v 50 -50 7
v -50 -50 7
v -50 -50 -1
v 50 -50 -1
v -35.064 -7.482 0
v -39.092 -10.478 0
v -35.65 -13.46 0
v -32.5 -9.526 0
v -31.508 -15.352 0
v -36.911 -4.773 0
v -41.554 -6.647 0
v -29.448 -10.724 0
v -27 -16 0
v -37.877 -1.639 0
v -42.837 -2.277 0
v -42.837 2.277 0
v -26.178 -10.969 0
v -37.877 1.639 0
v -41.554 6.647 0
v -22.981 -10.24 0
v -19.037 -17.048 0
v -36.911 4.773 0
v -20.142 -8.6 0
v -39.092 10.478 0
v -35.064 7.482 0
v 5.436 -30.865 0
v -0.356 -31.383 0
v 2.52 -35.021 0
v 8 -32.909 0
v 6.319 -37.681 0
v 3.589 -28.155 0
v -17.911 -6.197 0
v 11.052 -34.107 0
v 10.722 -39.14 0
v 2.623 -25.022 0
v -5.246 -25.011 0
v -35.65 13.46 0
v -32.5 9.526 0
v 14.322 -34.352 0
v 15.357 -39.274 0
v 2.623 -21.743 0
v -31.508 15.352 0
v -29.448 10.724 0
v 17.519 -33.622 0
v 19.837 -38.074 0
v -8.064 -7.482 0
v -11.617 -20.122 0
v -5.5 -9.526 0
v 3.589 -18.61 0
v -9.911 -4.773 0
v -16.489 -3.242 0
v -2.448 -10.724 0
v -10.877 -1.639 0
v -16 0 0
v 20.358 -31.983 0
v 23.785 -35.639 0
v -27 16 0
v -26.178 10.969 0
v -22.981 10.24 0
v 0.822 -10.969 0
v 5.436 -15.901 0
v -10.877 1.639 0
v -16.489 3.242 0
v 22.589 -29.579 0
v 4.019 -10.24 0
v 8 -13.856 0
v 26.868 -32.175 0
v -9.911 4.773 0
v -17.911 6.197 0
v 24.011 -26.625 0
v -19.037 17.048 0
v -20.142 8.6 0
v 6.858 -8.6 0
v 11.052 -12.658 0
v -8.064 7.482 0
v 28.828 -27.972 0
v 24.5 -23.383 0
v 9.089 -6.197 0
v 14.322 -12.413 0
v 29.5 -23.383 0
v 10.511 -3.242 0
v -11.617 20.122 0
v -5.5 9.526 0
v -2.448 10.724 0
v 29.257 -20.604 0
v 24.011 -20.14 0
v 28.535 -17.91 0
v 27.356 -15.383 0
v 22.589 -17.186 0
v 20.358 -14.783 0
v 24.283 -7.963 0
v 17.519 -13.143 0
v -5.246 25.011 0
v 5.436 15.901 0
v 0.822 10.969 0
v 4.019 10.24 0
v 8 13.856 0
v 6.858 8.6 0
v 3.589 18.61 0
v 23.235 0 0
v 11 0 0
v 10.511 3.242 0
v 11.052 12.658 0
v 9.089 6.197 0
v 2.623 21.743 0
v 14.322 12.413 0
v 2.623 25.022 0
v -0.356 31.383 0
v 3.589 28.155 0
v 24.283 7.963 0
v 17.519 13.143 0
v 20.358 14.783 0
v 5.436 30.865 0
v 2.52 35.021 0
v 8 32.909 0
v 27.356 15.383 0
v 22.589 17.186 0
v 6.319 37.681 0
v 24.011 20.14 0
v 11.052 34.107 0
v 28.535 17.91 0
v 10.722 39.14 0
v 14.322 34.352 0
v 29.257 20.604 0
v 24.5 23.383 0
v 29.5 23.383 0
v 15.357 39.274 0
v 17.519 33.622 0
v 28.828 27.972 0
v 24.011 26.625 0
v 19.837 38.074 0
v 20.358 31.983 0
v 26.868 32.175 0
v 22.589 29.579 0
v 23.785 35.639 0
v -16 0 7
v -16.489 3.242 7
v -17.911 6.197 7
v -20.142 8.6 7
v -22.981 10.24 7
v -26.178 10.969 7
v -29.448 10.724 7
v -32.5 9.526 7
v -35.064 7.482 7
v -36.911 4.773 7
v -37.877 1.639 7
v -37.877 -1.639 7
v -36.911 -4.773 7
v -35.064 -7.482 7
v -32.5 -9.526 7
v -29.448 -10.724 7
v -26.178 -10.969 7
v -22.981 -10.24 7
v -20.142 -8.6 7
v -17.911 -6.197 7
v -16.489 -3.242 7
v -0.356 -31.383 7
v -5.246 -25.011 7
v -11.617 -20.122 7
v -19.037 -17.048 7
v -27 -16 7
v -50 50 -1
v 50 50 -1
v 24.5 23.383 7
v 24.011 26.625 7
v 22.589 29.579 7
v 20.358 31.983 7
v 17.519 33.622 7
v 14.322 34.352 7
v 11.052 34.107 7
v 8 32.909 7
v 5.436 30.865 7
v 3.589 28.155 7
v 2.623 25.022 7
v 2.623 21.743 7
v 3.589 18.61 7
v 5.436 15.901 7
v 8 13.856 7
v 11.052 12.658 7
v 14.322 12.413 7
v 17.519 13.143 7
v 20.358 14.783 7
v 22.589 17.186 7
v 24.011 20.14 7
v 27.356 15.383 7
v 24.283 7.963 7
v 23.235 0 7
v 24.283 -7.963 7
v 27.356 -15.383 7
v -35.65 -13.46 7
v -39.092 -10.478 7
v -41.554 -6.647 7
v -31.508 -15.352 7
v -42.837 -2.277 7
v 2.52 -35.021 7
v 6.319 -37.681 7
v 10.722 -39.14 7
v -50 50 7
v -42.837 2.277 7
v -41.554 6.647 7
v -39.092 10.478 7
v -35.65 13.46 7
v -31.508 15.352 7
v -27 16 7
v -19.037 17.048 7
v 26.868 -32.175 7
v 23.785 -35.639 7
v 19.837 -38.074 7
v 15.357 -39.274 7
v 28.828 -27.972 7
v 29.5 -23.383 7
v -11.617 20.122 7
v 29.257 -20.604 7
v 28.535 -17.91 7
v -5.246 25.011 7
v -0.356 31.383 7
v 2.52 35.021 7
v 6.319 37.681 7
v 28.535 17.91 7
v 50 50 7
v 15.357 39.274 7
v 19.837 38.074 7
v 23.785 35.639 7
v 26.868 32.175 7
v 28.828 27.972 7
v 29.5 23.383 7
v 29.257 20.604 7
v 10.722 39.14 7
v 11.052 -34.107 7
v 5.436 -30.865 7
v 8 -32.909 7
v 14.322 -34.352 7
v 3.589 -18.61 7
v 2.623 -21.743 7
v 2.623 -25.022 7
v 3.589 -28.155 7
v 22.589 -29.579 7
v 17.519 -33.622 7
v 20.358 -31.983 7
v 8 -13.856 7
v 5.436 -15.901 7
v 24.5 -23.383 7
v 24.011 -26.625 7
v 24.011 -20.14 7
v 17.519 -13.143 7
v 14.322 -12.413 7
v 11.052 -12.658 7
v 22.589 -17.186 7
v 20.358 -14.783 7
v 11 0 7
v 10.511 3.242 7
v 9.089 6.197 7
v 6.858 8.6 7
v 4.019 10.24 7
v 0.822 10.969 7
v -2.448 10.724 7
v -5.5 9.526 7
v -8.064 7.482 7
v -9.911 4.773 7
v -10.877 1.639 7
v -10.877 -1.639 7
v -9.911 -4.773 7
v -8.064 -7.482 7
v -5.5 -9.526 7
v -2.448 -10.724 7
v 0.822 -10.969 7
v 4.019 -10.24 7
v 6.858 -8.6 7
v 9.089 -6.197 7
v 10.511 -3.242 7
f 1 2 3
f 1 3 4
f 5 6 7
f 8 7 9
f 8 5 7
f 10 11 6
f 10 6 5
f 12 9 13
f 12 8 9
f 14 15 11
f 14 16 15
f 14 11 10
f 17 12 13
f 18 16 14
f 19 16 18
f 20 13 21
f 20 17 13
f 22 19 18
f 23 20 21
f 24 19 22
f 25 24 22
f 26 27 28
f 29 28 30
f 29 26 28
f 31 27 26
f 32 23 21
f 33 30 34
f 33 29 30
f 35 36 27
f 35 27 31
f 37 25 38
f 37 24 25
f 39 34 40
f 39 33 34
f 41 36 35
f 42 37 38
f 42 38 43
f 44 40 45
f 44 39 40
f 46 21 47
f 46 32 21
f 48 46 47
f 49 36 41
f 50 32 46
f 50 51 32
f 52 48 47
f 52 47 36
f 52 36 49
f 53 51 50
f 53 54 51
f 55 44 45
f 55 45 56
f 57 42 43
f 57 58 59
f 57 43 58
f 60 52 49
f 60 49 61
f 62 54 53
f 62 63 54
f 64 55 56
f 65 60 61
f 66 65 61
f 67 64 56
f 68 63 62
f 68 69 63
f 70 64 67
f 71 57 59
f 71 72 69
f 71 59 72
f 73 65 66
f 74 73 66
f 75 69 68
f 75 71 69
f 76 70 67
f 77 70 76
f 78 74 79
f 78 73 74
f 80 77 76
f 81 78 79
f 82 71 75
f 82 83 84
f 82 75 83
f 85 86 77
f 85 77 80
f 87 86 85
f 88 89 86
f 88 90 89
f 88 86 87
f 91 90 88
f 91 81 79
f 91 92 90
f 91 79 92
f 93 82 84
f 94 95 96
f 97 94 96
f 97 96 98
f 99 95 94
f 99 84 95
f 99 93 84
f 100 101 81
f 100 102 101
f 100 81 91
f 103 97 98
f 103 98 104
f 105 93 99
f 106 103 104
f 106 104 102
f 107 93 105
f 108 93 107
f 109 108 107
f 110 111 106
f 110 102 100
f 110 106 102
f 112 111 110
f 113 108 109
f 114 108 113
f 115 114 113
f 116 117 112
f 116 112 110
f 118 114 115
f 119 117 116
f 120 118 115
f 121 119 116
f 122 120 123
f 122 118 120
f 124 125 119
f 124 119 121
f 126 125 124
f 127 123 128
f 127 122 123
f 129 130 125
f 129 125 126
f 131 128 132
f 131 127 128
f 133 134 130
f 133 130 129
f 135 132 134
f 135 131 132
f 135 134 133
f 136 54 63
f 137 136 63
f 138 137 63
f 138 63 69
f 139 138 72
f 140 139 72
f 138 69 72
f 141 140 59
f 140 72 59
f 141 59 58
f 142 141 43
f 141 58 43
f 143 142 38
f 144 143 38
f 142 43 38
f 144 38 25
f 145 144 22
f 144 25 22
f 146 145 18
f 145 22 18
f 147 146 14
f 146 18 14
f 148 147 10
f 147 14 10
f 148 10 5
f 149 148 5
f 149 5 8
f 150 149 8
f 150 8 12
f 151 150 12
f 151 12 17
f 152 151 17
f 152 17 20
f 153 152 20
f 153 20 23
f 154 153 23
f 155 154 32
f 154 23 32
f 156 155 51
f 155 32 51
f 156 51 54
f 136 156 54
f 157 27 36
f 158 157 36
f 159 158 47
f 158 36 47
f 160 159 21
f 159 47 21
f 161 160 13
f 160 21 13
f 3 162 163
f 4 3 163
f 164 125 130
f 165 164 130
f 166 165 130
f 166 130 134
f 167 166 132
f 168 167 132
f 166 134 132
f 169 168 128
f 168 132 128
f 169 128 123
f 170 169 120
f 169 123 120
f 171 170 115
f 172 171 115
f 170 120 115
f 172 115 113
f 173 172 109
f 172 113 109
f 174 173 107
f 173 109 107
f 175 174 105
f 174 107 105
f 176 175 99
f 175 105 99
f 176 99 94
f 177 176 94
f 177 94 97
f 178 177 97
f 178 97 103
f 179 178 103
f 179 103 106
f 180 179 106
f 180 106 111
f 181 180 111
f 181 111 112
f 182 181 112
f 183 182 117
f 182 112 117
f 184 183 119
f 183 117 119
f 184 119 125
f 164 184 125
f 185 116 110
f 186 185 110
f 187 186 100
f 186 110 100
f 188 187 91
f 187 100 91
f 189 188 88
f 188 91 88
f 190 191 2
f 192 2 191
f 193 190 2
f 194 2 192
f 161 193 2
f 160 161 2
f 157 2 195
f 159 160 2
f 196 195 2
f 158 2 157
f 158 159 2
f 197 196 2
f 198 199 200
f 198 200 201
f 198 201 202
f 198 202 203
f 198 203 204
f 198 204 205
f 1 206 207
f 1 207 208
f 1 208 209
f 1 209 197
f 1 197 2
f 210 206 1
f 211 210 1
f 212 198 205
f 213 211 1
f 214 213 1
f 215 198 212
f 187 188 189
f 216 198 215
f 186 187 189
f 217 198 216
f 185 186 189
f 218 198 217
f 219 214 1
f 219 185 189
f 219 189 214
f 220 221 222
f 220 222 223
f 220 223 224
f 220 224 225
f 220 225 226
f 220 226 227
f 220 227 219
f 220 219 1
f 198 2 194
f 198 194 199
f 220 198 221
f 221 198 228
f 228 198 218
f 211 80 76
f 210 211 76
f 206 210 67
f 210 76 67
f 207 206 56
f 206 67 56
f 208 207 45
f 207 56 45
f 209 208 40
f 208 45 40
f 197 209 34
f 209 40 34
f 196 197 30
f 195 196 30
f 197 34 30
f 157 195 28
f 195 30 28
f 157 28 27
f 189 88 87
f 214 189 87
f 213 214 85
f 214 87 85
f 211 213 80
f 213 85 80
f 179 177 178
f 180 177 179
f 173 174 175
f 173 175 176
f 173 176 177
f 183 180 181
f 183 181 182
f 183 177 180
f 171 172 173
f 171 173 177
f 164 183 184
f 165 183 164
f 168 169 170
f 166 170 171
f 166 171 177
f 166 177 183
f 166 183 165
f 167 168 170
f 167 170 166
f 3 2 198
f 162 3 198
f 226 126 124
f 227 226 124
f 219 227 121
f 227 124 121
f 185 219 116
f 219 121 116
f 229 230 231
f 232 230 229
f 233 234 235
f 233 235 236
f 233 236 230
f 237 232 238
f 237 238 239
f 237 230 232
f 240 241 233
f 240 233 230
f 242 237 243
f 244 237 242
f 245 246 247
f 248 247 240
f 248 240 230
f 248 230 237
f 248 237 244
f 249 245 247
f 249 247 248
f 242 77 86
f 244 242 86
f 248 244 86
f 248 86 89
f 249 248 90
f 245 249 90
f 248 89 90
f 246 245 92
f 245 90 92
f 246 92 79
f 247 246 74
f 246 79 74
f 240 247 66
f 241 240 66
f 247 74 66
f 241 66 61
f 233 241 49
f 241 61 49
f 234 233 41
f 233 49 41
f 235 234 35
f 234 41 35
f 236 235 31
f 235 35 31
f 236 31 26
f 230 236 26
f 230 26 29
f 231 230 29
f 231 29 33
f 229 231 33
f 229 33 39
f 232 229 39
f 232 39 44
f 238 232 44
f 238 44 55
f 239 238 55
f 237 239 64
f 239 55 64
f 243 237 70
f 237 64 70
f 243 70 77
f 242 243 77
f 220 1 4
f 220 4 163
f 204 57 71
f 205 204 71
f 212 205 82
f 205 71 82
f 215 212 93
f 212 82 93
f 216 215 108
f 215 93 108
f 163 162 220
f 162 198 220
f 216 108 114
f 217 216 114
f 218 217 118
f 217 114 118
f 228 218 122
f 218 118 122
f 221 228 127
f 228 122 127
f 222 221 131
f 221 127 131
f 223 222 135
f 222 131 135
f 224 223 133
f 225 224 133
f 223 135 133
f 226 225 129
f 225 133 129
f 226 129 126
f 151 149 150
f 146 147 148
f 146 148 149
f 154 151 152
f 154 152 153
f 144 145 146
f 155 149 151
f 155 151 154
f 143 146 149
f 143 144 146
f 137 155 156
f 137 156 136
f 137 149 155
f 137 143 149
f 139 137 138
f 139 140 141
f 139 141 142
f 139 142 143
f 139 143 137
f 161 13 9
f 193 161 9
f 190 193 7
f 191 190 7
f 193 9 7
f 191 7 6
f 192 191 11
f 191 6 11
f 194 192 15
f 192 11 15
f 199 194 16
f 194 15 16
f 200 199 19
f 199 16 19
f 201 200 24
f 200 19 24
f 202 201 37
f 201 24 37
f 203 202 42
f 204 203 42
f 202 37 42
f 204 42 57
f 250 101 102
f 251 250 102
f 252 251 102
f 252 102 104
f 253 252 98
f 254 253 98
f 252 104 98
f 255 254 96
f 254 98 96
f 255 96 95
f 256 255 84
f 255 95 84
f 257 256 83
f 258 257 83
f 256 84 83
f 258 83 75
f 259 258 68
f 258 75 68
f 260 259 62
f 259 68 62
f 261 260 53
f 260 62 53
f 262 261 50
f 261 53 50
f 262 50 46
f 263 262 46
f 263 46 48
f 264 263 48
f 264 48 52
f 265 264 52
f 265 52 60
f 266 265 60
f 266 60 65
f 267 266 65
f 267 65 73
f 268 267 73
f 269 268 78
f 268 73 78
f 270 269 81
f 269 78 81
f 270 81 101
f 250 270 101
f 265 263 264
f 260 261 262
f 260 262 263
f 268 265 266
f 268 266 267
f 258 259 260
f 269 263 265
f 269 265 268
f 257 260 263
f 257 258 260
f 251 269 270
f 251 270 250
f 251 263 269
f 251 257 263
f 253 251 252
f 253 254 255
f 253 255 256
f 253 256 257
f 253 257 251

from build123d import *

# Parameters (mm, degrees)
F0_W     = 100
F0_H     = 100
F1_DEPTH = 7
F0_R     = 11
F2_DEPTH = 7
F3_R     = 3.49999
F5_W     = 100
F5_H     = 100
F6_DEPTH = 1
F7_R     = 11
F8_DEPTH = 7


# Not quite as in the source:
# - a fillet or chamfer is up to 0.001 mm smaller than in the source, because OpenCascade refuses the exact size


with BuildPart() as f1:
    # F0 (on Top) → F1 (new body)
    with BuildSketch(Plane.XY):
        Rectangle(F0_W, F0_H)
        with BuildLine():
            ThreePointArc((-27, 16), (-11.6173140978, 20.1217782649), (-0.3564064606, 31.3826859022))
            ThreePointArc((-0.3564064606, 31.3826859022), (17.6411047216, 38.8374991228), (29.5, 23.3826859022))
            ThreePointArc((29.5, 23.3826859022), (28.9548132206, 19.2415811805), (27.3564064606, 15.3826859022))
            ThreePointArc((27.3564064606, 15.3826859022), (23.2346281956, 0), (27.3564064606, -15.3826859022))
            ThreePointArc((27.3564064606, -15.3826859022), (28.9548132206, -19.2415811805), (29.5, -23.3826859022))
            ThreePointArc((29.5, -23.3826859022), (17.6411047216, -38.8374991228), (-0.3564064606, -31.3826859022))
            ThreePointArc((-0.3564064606, -31.3826859022), (-11.6173140978, -20.1217782649), (-27, -16))
            ThreePointArc((-27, -16), (-43, 0), (-27, 16))
        make_face(mode=Mode.SUBTRACT)
    extrude(amount=F1_DEPTH)


with BuildPart() as f2:
    # F0 (on Top) → F2 (new body)
    with BuildSketch(Plane.XY):
        with BuildLine():
            ThreePointArc((-16, 0), (-15.3622914957, 4.472135955), (-13.5, 8.5877820187))
            ThreePointArc((-13.5, 8.5877820187), (-19.299497169, 14.0250581514), (-27, 16))
            ThreePointArc((-27, 16), (-43, 0), (-27, -16))
            ThreePointArc((-27, -16), (-19.299497169, -14.0250581514), (-13.5, -8.5877820187))
            ThreePointArc((-13.5, -8.5877820187), (-15.3622914957, -4.472135955), (-16, 0))
        make_face()
        with Locations((-27, 0)):
            Circle(F0_R, mode=Mode.SUBTRACT)
        with BuildLine():
            ThreePointArc((-0.3564064606, 31.3826859022), (-2.4963080642, 23.7263839043), (-0.6872373903, 15.9852339604))
            ThreePointArc((-0.6872373903, 15.9852339604), (3.8081625511, 15.5402026365), (8.0000002665, 13.8564063067))
            ThreePointArc((8.0000002665, 13.8564063067), (11.5541292005, 11.068066607), (14.1872373903, 7.3974519418))
            ThreePointArc((14.1872373903, 7.3974519418), (21.7958052331, 9.7013257529), (27.3564064606, 15.3826859022))
            ThreePointArc((27.3564064606, 15.3826859022), (28.9548132206, 19.2415811805), (29.5, 23.3826859022))
            ThreePointArc((29.5, 23.3826859022), (17.6411047216, 38.8374991228), (-0.3564064606, 31.3826859022))
        make_face()
        with BuildLine():
            ThreePointArc((24.5, 23.3826859022), (19.0000001332, 13.8564065375), (8.0000002665, 13.8564063067))
            ThreePointArc((8.0000002665, 13.8564063067), (7.9999998668, 32.9089652669), (24.5, 23.3826859022))
        make_face(mode=Mode.SUBTRACT)
        with BuildLine():
            ThreePointArc((-0.6872373903, 15.9852339604), (1.9458710013, 12.3146190845), (5.5000002388, 9.5262793037))
            ThreePointArc((5.5000002388, 9.5262793037), (9.6918377323, 7.8424831962), (14.1872373903, 7.3974519418))
            ThreePointArc((14.1872373903, 7.3974519418), (11.5541292005, 11.068066607), (8.0000002665, 13.8564063067))
            ThreePointArc((8.0000002665, 13.8564063067), (3.8081625511, 15.5402026365), (-0.6872373903, 15.9852339604))
        make_face()
        with BuildLine():
            ThreePointArc((27.3564064606, -15.3826859022), (21.7958052331, -9.7013257529), (14.1872373903, -7.3974519418))
            ThreePointArc((14.1872373903, -7.3974519418), (11.5541290581, -11.0680667557), (7.99999991, -13.8564065125))
            ThreePointArc((7.99999991, -13.8564065125), (3.8081623512, -15.5402026855), (-0.6872373903, -15.9852339604))
            ThreePointArc((-0.6872373903, -15.9852339604), (-2.4963080642, -23.7263839043), (-0.3564064606, -31.3826859022))
            ThreePointArc((-0.3564064606, -31.3826859022), (17.6411047216, -38.8374991228), (29.5, -23.3826859022))
            ThreePointArc((29.5, -23.3826859022), (28.9548132206, -19.2415811805), (27.3564064606, -15.3826859022))
        make_face()
        with BuildLine():
            ThreePointArc((24.5, -23.3826859022), (8.000000045, -32.9089653698), (7.99999991, -13.8564065125))
            ThreePointArc((7.99999991, -13.8564065125), (18.999999955, -13.8564064346), (24.5, -23.3826859022))
        make_face(mode=Mode.SUBTRACT)
        with BuildLine():
            ThreePointArc((14.1872373903, -7.3974519418), (9.6918376596, -7.842483214), (5.5000001093, -9.5262793785))
            ThreePointArc((5.5000001093, -9.5262793785), (1.9458709496, -12.3146191385), (-0.6872373903, -15.9852339604))
            ThreePointArc((-0.6872373903, -15.9852339604), (3.8081623512, -15.5402026855), (7.99999991, -13.8564065125))
            ThreePointArc((7.99999991, -13.8564065125), (11.5541290581, -11.0680667557), (14.1872373903, -7.3974519418))
        make_face()
        with BuildLine():
            ThreePointArc((-0.3564064606, -31.3826859022), (-2.4963080642, -23.7263839043), (-0.6872373903, -15.9852339604))
            ThreePointArc((-0.6872373903, -15.9852339604), (-8, -13.8564064606), (-13.5, -8.5877820187))
            ThreePointArc((-13.5, -8.5877820187), (-19.299497169, -14.0250581514), (-27, -16))
            ThreePointArc((-27, -16), (-11.6173140978, -20.1217782649), (-0.3564064606, -31.3826859022))
        make_face()
        with BuildLine():
            ThreePointArc((5.5000002388, 9.5262793037), (9.5262795106, 5.4999998806), (11, 0))
            ThreePointArc((11, 0), (9.5262794732, -5.4999999453), (5.5000001093, -9.5262793785))
            ThreePointArc((5.5000001093, -9.5262793785), (9.6918376596, -7.842483214), (14.1872373903, -7.3974519418))
            ThreePointArc((14.1872373903, -7.3974519418), (15.5402026731, -3.8081624017), (16, 0))
            ThreePointArc((16, 0), (15.5402026731, 3.8081624017), (14.1872373903, 7.3974519418))
            ThreePointArc((14.1872373903, 7.3974519418), (9.6918377323, 7.8424831962), (5.5000002388, 9.5262793037))
        make_face()
        with BuildLine():
            ThreePointArc((-0.6872373903, -15.9852339604), (1.9458709496, -12.3146191385), (5.5000001093, -9.5262793785))
            ThreePointArc((5.5000001093, -9.5262793785), (-5.4999999453, -9.5262794732), (-11, 0))
            ThreePointArc((-11, 0), (-11.6377085043, -4.472135955), (-13.5, -8.5877820187))
            ThreePointArc((-13.5, -8.5877820187), (-8, -13.8564064606), (-0.6872373903, -15.9852339604))
        make_face()
        with BuildLine():
            ThreePointArc((-13.5, -8.5877820187), (-11.6377085043, -4.472135955), (-11, 0))
            ThreePointArc((-11, 0), (-11.6377085043, 4.472135955), (-13.5, 8.5877820187))
            ThreePointArc((-13.5, 8.5877820187), (-15.3622914957, 4.472135955), (-16, 0))
            ThreePointArc((-16, 0), (-15.3622914957, -4.472135955), (-13.5, -8.5877820187))
        make_face()
        with BuildLine():
            ThreePointArc((-11, 0), (-5.4999998806, 9.5262795106), (5.5000002388, 9.5262793037))
            ThreePointArc((5.5000002388, 9.5262793037), (1.9458710013, 12.3146190845), (-0.6872373903, 15.9852339604))
            ThreePointArc((-0.6872373903, 15.9852339604), (-8, 13.8564064606), (-13.5, 8.5877820187))
            ThreePointArc((-13.5, 8.5877820187), (-11.6377085043, 4.472135955), (-11, 0))
        make_face()
        with BuildLine():
            ThreePointArc((-13.5, 8.5877820187), (-8, 13.8564064606), (-0.6872373903, 15.9852339604))
            ThreePointArc((-0.6872373903, 15.9852339604), (-2.4963080642, 23.7263839043), (-0.3564064606, 31.3826859022))
            ThreePointArc((-0.3564064606, 31.3826859022), (-11.6173140978, 20.1217782649), (-27, 16))
            ThreePointArc((-27, 16), (-19.299497169, 14.0250581514), (-13.5, 8.5877820187))
        make_face()
        with BuildLine():
            ThreePointArc((27.3564064606, 15.3826859022), (21.7958052331, 9.7013257529), (14.1872373903, 7.3974519418))
            ThreePointArc((14.1872373903, 7.3974519418), (15.5402026731, 3.8081624017), (16, 0))
            ThreePointArc((16, 0), (15.5402026731, -3.8081624017), (14.1872373903, -7.3974519418))
            ThreePointArc((14.1872373903, -7.3974519418), (21.7958052331, -9.7013257529), (27.3564064606, -15.3826859022))
            ThreePointArc((27.3564064606, -15.3826859022), (23.2346281956, 0), (27.3564064606, 15.3826859022))
        make_face()
    extrude(amount=F2_DEPTH)

    # F3 (radius 3.5 in the source; OpenCascade refuses exactly that, so slightly less here)
    f3_edges = [f2.edges().sort_by_distance(p)[0] for p in [
        (21.5, 37.239092, 7),
        (21.5, 37.239092, 0),
    ]]
    fillet(f3_edges, radius=F3_R)


with BuildPart() as f1_1:
    add(f1.part)

    # F4: cut F2
    add(f2.part, mode=Mode.SUBTRACT)

    # F5 (on Top) → F6 (join)
    with BuildSketch(Plane.XY):
        Rectangle(F5_W, F5_H)
    extrude(amount=-F6_DEPTH)

    # F7 (on face) → F8 (join)
    with BuildSketch(Plane.XY):
        Circle(F7_R)
        with Locations((13.5, 23.3826859022)):
            Circle(F7_R)
        with Locations((-27, 0)):
            Circle(F7_R)
        with Locations((13.5, -23.3826859022)):
            Circle(F7_R)
    extrude(amount=F8_DEPTH)


solid = f1_1.part
